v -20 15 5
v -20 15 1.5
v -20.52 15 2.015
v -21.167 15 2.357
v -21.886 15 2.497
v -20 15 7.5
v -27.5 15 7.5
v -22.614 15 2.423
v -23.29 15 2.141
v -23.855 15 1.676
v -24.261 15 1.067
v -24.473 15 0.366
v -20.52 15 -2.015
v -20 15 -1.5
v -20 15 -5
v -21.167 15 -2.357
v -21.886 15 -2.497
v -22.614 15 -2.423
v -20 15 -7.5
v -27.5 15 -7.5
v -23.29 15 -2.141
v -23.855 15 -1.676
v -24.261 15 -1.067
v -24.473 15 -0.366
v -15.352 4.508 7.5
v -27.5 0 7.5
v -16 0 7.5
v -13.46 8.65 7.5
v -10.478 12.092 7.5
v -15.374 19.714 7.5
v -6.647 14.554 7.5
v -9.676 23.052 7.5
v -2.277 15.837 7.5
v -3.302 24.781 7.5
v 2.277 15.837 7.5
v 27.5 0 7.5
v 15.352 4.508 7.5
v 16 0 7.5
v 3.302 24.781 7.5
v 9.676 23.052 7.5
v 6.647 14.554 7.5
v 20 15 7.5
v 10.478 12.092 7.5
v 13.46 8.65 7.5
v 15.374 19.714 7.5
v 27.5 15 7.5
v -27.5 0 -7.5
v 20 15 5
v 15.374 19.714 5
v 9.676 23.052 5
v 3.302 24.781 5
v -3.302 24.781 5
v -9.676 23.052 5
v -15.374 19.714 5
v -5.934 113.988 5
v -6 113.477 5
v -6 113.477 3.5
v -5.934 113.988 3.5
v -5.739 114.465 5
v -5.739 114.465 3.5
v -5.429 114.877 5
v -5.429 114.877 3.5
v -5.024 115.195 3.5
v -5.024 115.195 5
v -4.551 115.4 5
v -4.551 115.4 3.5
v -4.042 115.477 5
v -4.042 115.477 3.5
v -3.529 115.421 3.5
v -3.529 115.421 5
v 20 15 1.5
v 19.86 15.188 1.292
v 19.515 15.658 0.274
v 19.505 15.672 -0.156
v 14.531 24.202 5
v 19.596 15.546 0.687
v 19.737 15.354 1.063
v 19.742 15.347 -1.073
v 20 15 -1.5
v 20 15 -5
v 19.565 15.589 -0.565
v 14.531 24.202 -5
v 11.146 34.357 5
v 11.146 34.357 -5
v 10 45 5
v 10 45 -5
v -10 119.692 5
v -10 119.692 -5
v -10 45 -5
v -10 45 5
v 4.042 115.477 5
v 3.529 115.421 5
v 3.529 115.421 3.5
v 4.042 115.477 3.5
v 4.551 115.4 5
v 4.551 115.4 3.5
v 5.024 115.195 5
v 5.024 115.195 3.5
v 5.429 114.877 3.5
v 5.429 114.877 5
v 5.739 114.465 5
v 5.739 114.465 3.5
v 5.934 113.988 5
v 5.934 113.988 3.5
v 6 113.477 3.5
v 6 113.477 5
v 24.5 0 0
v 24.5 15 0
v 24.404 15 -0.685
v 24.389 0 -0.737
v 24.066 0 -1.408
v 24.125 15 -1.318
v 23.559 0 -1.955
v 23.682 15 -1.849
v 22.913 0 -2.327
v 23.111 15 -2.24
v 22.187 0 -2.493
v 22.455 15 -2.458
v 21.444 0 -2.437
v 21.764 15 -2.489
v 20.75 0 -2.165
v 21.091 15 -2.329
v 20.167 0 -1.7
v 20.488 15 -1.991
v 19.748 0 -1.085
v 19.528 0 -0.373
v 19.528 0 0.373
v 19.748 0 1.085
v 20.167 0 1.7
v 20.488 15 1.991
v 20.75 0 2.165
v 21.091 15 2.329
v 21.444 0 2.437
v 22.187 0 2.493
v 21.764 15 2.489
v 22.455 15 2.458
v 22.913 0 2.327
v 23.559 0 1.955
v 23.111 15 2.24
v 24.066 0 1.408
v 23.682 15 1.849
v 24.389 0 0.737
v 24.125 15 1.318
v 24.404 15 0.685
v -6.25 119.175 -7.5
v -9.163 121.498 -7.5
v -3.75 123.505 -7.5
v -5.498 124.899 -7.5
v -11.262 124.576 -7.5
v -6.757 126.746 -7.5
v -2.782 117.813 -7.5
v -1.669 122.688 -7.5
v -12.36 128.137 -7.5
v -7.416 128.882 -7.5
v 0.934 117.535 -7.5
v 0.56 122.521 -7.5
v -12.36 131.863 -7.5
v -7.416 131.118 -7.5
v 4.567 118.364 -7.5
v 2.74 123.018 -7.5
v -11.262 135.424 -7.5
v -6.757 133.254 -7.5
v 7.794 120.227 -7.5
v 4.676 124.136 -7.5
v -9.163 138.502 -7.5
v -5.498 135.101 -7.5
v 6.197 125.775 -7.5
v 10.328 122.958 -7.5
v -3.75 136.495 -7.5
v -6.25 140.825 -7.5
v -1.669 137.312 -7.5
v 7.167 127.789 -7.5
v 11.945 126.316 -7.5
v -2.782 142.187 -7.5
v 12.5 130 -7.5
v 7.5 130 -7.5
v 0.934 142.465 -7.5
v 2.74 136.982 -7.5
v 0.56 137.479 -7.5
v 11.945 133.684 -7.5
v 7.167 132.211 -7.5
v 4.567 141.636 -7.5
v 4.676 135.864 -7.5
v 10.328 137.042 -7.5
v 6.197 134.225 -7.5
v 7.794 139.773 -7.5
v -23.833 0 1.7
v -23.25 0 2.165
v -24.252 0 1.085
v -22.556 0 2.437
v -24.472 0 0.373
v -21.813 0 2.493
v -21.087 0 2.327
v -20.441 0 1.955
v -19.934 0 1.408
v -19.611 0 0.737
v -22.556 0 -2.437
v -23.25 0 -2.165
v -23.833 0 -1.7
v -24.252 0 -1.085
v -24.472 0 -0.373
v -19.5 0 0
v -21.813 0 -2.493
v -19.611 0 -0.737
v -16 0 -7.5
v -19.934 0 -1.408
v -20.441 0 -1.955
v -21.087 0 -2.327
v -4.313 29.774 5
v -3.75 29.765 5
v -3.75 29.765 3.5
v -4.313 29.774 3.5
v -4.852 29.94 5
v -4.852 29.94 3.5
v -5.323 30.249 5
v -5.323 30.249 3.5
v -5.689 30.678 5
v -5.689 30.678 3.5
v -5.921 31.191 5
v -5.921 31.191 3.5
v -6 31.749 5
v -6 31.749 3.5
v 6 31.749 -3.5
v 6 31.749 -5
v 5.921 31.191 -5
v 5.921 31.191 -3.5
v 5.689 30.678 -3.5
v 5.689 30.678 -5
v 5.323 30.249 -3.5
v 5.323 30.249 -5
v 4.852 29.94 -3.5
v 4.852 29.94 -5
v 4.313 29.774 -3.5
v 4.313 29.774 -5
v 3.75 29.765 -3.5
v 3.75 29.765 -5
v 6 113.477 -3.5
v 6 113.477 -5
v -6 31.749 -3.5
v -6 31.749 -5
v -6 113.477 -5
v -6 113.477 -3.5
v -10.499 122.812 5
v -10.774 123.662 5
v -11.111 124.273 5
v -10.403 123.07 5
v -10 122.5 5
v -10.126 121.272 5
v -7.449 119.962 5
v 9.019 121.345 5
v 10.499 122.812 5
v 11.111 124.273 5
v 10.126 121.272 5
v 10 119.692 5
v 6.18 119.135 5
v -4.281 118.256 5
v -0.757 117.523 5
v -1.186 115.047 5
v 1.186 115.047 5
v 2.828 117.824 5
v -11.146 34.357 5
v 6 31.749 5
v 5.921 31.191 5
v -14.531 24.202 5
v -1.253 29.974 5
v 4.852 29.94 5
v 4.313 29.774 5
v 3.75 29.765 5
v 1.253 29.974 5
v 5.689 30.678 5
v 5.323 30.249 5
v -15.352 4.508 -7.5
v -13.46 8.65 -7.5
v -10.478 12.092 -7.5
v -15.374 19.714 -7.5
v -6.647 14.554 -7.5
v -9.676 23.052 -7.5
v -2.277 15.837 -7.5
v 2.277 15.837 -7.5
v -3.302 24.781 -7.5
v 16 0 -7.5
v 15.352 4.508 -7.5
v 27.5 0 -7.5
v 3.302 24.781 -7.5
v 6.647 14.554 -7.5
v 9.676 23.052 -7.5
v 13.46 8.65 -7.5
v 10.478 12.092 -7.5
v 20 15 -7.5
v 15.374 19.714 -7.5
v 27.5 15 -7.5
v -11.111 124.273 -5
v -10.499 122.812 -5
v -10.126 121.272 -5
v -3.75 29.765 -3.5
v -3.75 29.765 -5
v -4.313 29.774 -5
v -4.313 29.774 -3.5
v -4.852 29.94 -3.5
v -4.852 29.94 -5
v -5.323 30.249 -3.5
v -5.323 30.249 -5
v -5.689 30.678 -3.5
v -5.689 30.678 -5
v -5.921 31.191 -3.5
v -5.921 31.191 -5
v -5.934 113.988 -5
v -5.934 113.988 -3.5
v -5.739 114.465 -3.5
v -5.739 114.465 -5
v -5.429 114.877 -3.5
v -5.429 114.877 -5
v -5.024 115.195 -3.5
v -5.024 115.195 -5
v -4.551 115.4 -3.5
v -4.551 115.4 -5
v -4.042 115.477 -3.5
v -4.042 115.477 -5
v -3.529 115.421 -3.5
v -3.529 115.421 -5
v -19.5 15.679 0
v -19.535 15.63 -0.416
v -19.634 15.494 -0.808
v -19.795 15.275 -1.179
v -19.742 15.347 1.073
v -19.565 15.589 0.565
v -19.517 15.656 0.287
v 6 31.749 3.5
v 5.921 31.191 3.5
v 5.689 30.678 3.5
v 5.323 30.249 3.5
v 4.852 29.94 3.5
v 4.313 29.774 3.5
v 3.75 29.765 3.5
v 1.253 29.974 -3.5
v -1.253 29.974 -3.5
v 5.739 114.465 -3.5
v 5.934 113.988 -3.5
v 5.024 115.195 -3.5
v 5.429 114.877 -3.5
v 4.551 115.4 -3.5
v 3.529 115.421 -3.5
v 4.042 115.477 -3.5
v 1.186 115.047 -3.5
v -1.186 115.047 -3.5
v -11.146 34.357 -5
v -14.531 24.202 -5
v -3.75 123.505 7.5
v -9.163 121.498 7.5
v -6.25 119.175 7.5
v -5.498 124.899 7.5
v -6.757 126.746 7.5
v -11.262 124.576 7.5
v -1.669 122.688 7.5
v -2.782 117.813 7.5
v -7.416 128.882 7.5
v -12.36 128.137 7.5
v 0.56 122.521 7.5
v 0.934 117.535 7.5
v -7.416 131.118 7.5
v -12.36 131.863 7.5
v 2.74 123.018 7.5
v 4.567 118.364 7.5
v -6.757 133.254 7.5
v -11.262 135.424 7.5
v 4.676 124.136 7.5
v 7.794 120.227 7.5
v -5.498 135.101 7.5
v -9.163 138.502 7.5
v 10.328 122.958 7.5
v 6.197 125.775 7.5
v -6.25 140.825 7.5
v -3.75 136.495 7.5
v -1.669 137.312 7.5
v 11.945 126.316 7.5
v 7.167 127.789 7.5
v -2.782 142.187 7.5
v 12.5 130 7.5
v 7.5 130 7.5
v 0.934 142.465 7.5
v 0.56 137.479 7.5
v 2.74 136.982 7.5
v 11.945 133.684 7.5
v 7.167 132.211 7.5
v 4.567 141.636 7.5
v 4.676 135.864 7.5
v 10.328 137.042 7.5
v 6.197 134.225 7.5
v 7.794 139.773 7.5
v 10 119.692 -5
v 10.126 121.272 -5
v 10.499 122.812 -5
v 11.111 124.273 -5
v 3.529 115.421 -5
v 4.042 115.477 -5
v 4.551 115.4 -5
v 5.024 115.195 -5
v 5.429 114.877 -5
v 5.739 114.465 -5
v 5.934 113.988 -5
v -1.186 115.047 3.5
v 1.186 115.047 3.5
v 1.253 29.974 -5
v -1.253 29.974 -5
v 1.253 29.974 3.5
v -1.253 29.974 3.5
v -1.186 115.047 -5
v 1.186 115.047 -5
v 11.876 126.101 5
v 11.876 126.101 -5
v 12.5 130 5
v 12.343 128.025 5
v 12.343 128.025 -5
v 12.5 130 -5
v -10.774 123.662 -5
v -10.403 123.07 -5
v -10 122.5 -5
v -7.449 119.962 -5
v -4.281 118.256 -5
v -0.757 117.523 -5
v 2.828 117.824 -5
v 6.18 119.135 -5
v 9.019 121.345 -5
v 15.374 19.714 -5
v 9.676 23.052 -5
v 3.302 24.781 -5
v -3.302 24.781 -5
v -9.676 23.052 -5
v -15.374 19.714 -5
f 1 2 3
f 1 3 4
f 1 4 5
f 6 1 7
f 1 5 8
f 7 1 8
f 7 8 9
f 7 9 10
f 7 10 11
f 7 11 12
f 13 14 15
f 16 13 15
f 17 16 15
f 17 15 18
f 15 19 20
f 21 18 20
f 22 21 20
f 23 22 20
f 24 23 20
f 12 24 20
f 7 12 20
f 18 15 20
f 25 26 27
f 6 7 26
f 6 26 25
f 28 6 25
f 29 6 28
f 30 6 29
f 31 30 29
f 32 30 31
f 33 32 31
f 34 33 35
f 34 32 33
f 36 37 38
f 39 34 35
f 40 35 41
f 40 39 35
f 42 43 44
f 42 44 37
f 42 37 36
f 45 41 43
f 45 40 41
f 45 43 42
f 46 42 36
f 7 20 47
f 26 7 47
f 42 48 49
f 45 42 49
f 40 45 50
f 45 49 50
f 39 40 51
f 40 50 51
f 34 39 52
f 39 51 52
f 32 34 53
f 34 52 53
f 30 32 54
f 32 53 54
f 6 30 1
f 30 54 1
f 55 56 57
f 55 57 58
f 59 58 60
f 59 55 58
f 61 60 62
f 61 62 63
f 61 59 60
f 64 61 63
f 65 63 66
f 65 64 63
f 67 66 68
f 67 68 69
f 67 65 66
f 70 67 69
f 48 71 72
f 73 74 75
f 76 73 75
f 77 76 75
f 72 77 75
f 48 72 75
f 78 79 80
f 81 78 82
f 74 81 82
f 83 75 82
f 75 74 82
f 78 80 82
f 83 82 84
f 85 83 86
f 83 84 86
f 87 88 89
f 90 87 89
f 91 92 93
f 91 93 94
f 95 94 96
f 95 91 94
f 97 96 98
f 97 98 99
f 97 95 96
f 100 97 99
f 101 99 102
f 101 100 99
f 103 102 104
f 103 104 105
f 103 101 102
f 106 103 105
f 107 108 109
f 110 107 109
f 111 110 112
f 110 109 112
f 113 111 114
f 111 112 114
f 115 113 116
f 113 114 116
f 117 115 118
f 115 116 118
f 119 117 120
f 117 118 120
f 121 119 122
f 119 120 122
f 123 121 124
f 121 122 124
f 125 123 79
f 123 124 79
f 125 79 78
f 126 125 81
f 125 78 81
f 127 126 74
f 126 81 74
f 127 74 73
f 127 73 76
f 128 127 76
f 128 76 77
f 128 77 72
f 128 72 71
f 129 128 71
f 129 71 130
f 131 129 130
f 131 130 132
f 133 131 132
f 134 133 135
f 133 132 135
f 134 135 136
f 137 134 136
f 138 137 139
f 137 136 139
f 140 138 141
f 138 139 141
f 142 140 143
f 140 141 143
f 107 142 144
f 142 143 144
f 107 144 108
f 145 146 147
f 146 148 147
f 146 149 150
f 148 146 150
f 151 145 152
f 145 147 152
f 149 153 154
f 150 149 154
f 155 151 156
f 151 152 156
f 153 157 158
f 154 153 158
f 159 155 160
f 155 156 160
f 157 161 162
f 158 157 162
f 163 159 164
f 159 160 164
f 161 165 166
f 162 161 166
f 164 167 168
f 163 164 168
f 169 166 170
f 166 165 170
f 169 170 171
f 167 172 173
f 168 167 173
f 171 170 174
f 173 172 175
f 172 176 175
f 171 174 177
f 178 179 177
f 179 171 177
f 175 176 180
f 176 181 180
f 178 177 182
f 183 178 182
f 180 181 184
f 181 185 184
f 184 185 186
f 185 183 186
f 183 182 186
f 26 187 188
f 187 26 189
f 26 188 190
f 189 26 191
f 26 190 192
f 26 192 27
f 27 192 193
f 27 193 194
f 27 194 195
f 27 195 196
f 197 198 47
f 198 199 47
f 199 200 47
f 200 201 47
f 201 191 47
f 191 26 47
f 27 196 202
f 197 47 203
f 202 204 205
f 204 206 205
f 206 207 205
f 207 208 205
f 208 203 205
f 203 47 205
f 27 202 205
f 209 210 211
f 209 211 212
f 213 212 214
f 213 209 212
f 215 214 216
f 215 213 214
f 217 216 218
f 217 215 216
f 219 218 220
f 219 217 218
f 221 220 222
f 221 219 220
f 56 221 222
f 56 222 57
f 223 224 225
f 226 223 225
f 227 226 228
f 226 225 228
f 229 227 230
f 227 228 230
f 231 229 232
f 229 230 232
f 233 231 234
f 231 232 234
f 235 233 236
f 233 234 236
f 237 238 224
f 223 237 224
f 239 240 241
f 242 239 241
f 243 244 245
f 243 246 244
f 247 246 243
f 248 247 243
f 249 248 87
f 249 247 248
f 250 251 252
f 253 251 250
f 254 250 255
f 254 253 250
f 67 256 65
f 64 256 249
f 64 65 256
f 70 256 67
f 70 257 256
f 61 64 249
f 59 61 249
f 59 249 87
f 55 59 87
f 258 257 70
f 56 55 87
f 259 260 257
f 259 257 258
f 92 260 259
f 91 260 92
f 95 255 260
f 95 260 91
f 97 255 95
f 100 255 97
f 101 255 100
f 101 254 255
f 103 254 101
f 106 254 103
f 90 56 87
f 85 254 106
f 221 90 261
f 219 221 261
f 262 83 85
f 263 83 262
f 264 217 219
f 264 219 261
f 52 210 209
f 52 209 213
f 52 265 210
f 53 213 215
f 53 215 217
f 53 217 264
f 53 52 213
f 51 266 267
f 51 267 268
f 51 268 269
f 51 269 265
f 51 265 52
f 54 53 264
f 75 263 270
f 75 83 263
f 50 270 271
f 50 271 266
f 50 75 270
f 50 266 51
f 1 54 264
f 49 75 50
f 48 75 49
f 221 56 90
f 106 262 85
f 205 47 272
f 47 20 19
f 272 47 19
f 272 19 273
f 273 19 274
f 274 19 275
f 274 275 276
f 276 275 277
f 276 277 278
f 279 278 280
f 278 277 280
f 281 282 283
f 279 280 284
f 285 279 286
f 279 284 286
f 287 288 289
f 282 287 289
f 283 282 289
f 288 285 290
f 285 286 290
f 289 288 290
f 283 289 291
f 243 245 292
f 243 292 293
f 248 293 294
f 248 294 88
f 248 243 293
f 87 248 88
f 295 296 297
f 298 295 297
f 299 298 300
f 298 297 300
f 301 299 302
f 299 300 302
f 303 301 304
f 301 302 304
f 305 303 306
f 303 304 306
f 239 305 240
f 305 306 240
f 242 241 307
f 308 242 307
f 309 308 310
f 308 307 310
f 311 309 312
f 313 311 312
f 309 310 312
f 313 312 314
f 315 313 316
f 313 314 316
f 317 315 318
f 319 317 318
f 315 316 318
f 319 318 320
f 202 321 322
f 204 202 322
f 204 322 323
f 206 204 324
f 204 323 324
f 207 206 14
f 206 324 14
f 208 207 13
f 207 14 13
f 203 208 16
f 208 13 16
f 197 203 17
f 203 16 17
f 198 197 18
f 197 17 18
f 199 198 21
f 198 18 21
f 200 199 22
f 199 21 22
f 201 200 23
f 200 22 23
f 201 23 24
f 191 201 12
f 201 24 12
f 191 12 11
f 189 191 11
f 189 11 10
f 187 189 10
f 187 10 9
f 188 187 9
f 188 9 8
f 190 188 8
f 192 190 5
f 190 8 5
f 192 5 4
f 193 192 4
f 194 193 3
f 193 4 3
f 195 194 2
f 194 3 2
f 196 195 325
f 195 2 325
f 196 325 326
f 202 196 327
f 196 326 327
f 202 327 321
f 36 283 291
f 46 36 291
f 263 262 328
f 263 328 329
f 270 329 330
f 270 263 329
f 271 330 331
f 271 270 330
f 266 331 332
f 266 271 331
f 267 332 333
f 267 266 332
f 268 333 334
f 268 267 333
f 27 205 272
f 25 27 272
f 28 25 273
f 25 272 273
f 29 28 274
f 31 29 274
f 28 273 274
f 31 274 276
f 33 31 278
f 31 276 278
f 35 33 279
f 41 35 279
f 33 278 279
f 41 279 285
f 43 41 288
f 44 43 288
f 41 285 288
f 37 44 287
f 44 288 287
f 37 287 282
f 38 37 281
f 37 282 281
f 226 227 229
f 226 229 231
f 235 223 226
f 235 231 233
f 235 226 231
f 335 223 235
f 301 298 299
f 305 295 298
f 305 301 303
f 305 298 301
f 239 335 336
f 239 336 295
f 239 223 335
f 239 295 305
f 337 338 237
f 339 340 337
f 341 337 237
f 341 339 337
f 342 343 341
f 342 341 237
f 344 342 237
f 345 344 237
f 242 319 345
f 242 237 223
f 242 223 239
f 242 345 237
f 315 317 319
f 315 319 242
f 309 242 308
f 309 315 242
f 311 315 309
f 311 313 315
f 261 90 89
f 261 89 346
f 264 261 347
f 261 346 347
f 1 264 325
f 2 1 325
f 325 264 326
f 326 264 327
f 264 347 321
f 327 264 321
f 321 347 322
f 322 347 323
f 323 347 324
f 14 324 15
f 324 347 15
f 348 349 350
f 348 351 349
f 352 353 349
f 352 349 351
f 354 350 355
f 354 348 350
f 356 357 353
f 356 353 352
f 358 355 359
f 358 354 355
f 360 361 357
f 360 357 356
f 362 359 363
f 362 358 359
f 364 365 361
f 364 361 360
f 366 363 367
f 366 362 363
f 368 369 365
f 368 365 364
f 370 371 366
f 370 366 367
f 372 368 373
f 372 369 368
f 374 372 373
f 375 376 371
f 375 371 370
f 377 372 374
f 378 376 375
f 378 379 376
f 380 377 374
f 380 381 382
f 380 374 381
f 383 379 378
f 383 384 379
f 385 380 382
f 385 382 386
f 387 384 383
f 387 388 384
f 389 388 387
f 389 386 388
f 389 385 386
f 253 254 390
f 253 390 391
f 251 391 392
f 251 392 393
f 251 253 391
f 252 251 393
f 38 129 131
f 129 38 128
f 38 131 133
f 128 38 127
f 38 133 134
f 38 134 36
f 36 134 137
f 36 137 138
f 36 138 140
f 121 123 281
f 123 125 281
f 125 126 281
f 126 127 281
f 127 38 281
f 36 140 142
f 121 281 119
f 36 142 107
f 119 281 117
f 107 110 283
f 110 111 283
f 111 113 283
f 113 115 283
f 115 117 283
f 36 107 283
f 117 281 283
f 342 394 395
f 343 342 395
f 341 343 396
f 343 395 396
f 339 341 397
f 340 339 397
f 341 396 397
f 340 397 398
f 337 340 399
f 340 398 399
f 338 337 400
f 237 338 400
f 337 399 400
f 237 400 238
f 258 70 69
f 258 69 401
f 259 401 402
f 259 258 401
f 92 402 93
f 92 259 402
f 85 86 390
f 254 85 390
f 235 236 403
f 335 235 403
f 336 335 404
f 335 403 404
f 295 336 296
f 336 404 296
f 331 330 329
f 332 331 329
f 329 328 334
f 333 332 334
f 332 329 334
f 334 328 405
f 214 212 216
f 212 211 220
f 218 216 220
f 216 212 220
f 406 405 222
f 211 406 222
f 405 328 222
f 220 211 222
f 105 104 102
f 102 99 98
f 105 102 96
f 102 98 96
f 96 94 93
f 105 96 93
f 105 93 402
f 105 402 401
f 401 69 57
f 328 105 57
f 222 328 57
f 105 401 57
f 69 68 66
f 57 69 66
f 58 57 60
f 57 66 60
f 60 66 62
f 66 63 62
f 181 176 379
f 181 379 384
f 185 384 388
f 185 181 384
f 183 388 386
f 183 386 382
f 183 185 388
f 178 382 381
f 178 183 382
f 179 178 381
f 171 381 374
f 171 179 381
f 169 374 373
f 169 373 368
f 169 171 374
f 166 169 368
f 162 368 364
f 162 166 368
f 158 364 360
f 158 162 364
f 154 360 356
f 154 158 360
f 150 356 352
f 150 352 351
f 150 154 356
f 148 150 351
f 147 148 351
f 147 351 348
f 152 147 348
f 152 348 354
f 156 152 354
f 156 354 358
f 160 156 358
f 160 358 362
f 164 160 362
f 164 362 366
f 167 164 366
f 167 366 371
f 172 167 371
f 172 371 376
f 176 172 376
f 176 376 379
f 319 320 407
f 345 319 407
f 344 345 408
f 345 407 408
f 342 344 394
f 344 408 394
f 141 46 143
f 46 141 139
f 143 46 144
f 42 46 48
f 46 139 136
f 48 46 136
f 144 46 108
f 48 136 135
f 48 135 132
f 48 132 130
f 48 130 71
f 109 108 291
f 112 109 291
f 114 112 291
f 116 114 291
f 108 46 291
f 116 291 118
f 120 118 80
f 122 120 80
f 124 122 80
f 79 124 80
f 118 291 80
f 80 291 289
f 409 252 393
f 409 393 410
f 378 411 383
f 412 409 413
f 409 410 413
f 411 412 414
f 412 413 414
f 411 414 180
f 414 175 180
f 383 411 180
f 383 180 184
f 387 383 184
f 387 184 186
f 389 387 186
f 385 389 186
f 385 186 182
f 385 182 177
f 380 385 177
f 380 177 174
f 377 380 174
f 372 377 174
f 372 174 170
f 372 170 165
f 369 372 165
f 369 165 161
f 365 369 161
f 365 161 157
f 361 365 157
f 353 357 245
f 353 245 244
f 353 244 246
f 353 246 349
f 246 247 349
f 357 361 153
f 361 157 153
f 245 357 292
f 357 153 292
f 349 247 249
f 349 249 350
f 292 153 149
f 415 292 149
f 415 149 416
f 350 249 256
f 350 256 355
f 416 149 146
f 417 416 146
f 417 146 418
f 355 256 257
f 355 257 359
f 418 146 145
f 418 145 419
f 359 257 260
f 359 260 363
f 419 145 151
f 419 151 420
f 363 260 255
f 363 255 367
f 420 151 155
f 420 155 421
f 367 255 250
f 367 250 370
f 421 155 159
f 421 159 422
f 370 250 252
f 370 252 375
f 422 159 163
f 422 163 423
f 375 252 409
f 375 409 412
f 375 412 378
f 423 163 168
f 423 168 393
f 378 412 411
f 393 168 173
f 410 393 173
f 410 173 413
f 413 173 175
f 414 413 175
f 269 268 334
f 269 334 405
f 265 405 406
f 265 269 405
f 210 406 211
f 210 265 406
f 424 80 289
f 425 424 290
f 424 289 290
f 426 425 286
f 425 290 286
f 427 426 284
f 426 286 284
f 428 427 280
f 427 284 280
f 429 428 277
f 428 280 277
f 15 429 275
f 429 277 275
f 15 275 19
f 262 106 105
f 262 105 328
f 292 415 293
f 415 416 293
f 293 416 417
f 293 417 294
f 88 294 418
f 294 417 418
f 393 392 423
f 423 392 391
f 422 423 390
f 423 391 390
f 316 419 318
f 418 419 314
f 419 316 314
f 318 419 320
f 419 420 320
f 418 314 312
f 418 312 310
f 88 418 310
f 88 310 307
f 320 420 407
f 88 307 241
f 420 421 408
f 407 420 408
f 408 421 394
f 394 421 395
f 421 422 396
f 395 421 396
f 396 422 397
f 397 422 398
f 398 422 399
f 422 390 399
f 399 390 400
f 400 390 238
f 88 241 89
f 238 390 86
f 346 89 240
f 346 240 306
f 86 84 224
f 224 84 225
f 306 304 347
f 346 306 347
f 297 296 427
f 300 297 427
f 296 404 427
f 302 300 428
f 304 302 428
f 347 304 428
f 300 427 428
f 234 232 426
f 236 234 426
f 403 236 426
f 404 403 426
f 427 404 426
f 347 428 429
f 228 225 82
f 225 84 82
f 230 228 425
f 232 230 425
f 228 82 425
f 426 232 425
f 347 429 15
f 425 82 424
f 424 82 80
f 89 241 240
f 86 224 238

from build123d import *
from build123d.topology import SkipClean

# Parameters (mm, degrees)
BOSS_EXTRUDE1_DEPTH      = 5
BOSS_EXTRUDE1_DEPTH_BACK = 5
SKETCH2_R                = 7.5
BOSS_EXTRUDE2_DEPTH      = 7.5
BOSS_EXTRUDE2_DEPTH_BACK = 7.5
BOSS_EXTRUDE3_DEPTH      = 7.5
BOSS_EXTRUDE3_DEPTH_BACK = 7.5
SKETCH5_R                = 12.5
SKETCH5_R_2              = 7.5
CUT_EXTRUDE1_DEPTH       = 1.5
FILLET1_R                = 10
TAP_DRILL_FOR_M6_TAP1_D  = 5


with BuildPart() as part:
    # Sketch2 → Boss-Extrude1 (new, two sides: drawn at the far end of the back side and taken through both)
    with BuildSketch(Plane.XY.offset(-BOSS_EXTRUDE1_DEPTH_BACK)):
        with BuildLine():
            Line((-27.5, 0), (-16, 0))
            ThreePointArc((-16, 0), (0, 16), (16, 0))
            Line((16, 0), (27.5, 0))
            Line((27.5, 0), (27.5, 15))
            Line((27.5, 15), (20, 15))
            ThreePointArc((20, 15), (12.565835097, 29.188611699), (10, 45))
            Line((10, 45), (10, 122.5))
            ThreePointArc((10, 122.5), (0, 142.5), (-10, 122.5))
            Line((-10, 122.5), (-10, 45))
            ThreePointArc((-10, 45), (-12.565835097, 29.188611699), (-20, 15))
            Line((-20, 15), (-27.5, 15))
            Line((-27.5, 15), (-27.5, 0))
        make_face()
        with Locations((0, 130)):
            Circle(SKETCH2_R, mode=Mode.SUBTRACT)
    extrude(amount=BOSS_EXTRUDE1_DEPTH + BOSS_EXTRUDE1_DEPTH_BACK)

    # Sketch3 → Boss-Extrude2 (add, two sides: drawn at the far end of the back side and taken through both)
    with BuildSketch(Plane.XY.offset(-BOSS_EXTRUDE2_DEPTH_BACK)):
        with BuildLine():
            Line((-27.5, 15), (-27.5, 0))
            Line((-27.5, 0), (-16, 0))
            ThreePointArc((-16, 0), (0, 16), (16, 0))
            Line((16, 0), (27.5, 0))
            Line((27.5, 0), (27.5, 15))
            Line((27.5, 15), (20, 15))
            ThreePointArc((20, 15), (0, 25), (-20, 15))
            Line((-20, 15), (-27.5, 15))
        make_face()
    extrude(amount=BOSS_EXTRUDE2_DEPTH + BOSS_EXTRUDE2_DEPTH_BACK)

    # Sketch5 → Boss-Extrude3 (add, two sides: drawn at the far end of the back side and taken through both)
    with SkipClean():  # the faces are left unmerged after this step: merging them gives an invalid solid
        with BuildSketch(Plane.XY.offset(-BOSS_EXTRUDE3_DEPTH_BACK)):
            with Locations((0, 130)):
                Circle(SKETCH5_R)
            with Locations((0, 130)):
                Circle(SKETCH5_R_2, mode=Mode.SUBTRACT)
        extrude(amount=BOSS_EXTRUDE3_DEPTH + BOSS_EXTRUDE3_DEPTH_BACK)
    add(part.part.scale(1), mode=Mode.REPLACE)  # the faces are merged on a copy

    # Sketch6 → Cut-Extrude1 (cut)
    with BuildSketch(Plane.XY.offset(5)):
        with BuildLine():
            Line((-6, 31.749015733), (-6, 113.477288358))
            ThreePointArc((-6, 113.477288358), (-5.236693885, 115.049098854), (-3.529411765, 115.421136787))
            ThreePointArc((-3.529411765, 115.421136787), (0, 115), (3.529411765, 115.421136787))
            ThreePointArc((3.529411765, 115.421136787), (5.236693885, 115.049098854), (6, 113.477288358))
            Line((6, 113.477288358), (6, 31.749015733))
            ThreePointArc((6, 31.749015733), (5.322875656, 30.249015733), (3.75, 29.764702249))
            ThreePointArc((3.75, 29.764702249), (0, 30), (-3.75, 29.764702249))
            ThreePointArc((-3.75, 29.764702249), (-5.322875656, 30.249015733), (-6, 31.749015733))
        make_face()
    cut_extrude1 = extrude(amount=-CUT_EXTRUDE1_DEPTH, mode=Mode.SUBTRACT)

    # Mirror1: Cut-Extrude1 across plane
    add(cut_extrude1.mirror(Plane.XY), mode=Mode.SUBTRACT)

    # Fillet1
    # the kernel refuses this fillet: 10 mm, written as the material it adds along each edge
    with BuildSketch(Plane(origin=(-10, 122.5, 5), x_dir=(0, -1, 0), z_dir=(0, 0, -1))) as fillet1_piece_1:
        with BuildLine():
            CenterArc((2.807764064, 10), FILLET1_R, 242.733955549, 27.266044451)
            ThreePointArc((-1.773464409, 1.111111111), (-0.863438171, 0.592735581), (0, 0))
            Line((0, 0), (2.807764064, 0))
        make_face()
    extrude(amount=10)
    with BuildSketch(Plane(origin=(10, 122.5, 5), x_dir=(0.5309249463264099, 0.8474188464792949, 0), z_dir=(0, 0, -1))) as fillet1_piece_2:
        with BuildLine():
            CenterArc((2.929897279, 9.96490045), FILLET1_R, 237.932028952, 27.266044451)
            Line((-2.379352184, 1.490711985), (0, 0))
            ThreePointArc((0, 0), (1.046391885, 0.043874438), (2.092783771, 0))
        make_face()
    extrude(amount=10)

    # Tap Drill for M6 Tap1 (through all)
    with Locations(Plane(origin=(0, 0, 0), x_dir=(-1, 0, 0), z_dir=(0, -1, 0))):
        with Locations((22, 0), (-22, 0)):
            Hole(TAP_DRILL_FOR_M6_TAP1_D / 2)


solid = part.part
